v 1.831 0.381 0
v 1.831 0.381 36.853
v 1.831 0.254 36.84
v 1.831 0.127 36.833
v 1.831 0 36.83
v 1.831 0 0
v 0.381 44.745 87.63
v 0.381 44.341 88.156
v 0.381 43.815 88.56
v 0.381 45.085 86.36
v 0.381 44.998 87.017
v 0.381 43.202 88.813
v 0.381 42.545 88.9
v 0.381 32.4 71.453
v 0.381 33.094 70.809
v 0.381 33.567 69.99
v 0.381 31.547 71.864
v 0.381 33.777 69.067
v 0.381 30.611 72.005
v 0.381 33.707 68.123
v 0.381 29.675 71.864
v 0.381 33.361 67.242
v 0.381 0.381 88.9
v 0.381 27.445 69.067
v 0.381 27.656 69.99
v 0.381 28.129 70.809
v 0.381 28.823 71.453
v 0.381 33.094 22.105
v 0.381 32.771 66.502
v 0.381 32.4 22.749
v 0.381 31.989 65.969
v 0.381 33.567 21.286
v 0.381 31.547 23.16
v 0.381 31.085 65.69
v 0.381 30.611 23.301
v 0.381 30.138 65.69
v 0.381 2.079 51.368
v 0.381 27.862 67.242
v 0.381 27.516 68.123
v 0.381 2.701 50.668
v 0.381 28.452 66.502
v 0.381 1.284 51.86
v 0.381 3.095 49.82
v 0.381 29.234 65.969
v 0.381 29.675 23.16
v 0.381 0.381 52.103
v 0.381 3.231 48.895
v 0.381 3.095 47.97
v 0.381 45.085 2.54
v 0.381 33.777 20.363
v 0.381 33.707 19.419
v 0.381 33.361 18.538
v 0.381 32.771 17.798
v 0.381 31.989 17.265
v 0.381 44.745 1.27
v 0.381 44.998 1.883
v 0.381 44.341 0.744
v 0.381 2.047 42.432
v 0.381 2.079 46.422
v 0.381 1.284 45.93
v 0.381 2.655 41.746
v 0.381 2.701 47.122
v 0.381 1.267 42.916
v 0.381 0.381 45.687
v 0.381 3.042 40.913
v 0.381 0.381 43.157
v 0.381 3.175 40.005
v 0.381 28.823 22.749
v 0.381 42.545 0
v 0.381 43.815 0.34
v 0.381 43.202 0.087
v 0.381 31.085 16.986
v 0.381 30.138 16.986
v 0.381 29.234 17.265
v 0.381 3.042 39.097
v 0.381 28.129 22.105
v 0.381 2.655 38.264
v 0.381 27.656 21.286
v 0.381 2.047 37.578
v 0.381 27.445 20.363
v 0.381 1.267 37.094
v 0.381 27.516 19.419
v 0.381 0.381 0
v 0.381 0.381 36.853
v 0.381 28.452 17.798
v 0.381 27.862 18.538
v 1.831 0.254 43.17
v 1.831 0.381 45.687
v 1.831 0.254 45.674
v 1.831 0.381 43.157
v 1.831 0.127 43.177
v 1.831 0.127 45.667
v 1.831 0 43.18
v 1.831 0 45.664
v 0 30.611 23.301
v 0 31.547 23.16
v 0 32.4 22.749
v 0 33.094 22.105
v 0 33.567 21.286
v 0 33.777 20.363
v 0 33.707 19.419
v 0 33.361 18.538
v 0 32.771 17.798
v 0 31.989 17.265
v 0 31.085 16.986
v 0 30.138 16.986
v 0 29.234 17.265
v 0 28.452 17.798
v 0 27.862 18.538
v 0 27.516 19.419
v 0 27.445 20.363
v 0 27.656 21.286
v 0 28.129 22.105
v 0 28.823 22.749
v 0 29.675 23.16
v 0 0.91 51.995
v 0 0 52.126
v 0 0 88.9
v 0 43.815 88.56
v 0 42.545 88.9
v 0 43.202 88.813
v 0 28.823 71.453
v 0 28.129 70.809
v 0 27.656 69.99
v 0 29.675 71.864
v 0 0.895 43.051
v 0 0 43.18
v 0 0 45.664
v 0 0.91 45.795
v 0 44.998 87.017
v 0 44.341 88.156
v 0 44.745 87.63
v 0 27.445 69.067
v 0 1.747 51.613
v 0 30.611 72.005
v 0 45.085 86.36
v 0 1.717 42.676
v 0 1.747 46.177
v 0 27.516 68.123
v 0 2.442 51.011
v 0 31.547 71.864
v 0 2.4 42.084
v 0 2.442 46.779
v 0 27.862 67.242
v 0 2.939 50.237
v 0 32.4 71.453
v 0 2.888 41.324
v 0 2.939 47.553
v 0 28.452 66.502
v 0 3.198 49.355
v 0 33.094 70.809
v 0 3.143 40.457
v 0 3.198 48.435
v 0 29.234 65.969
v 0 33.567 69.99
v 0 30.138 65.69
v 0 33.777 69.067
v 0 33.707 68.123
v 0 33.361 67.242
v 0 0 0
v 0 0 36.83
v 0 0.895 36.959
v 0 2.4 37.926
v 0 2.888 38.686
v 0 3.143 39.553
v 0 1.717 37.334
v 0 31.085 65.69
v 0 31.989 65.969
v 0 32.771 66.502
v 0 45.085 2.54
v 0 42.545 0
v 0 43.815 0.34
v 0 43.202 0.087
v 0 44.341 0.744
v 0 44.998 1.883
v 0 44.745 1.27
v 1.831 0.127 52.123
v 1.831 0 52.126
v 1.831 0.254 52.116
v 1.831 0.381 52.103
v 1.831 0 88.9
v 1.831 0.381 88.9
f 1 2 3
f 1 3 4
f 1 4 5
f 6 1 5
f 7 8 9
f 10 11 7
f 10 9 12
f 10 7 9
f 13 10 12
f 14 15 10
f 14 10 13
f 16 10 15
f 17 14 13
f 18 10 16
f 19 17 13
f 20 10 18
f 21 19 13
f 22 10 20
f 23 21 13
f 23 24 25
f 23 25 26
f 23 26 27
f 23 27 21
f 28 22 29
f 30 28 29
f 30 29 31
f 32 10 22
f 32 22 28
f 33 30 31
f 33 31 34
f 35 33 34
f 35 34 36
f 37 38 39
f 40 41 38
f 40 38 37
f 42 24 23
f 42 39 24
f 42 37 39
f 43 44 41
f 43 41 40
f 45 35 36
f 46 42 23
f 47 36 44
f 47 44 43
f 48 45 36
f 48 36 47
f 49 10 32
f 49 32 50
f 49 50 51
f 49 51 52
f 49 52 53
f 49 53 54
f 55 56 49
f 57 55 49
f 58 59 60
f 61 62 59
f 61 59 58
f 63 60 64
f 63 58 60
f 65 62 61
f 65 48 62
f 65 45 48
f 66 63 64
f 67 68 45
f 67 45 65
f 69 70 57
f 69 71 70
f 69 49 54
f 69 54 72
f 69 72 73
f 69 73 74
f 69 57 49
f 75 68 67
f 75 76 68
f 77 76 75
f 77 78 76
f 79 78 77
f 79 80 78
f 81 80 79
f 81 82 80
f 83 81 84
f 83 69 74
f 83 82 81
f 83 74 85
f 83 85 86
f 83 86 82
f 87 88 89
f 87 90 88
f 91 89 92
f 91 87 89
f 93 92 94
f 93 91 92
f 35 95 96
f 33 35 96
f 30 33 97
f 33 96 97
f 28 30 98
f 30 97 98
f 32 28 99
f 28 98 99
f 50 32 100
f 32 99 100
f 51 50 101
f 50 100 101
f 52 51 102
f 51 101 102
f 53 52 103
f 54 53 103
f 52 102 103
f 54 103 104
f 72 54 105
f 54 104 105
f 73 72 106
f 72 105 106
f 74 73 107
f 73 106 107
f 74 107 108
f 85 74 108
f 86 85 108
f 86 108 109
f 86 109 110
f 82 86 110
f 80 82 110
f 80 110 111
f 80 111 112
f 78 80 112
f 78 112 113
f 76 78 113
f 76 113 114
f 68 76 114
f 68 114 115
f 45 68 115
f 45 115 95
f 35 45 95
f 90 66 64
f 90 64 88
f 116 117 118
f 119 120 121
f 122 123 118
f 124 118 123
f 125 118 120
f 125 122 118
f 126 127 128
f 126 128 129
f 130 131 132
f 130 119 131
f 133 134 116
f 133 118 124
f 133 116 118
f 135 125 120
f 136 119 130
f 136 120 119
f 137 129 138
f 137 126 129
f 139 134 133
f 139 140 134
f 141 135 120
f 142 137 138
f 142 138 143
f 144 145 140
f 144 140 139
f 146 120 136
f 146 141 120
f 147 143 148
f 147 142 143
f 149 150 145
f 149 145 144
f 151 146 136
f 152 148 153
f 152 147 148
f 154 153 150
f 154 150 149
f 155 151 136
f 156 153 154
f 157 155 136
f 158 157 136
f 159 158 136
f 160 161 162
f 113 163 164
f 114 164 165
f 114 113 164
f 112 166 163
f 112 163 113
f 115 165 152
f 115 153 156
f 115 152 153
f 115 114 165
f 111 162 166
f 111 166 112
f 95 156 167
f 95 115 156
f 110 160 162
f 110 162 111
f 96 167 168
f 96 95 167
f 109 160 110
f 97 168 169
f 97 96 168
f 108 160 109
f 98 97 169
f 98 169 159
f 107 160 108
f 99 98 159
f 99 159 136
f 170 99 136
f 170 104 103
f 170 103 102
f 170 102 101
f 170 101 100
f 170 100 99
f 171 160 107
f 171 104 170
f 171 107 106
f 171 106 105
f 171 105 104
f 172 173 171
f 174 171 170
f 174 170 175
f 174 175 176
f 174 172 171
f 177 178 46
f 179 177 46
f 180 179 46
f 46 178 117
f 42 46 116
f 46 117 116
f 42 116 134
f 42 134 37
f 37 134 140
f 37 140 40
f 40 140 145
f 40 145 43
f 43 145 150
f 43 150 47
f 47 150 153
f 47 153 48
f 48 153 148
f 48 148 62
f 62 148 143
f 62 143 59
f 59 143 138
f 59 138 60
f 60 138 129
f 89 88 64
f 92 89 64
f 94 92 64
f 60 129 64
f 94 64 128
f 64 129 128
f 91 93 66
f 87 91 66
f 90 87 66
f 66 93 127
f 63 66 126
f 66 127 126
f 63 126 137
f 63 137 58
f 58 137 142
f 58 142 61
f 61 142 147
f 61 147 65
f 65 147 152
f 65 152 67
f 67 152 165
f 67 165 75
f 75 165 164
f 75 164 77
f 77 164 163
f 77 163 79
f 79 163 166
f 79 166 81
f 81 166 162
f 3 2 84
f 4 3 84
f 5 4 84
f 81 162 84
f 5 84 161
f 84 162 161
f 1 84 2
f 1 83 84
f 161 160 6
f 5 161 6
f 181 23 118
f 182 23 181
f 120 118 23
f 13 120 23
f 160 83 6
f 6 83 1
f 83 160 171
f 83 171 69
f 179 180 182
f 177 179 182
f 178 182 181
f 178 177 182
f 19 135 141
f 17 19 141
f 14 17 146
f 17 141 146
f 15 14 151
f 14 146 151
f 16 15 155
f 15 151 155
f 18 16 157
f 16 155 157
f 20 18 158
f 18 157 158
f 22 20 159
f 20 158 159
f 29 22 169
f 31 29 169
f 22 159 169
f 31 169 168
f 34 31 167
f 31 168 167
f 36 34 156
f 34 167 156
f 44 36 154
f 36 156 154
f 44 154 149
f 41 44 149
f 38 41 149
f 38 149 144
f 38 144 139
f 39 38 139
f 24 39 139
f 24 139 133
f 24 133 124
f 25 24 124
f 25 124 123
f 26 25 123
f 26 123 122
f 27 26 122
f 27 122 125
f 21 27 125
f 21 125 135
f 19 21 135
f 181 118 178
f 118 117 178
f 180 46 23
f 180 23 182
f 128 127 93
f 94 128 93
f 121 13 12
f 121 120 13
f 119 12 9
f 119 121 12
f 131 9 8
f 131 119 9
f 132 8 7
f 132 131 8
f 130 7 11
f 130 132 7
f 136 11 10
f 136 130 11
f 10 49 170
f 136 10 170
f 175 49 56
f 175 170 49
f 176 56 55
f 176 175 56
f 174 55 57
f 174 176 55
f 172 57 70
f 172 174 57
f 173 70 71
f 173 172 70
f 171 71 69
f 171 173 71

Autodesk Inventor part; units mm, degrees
ref_plane "YZ Plane" through (0, 0, 0) normal (1, 0, 0) x (0, 1, 0)
ref_plane "XZ Plane" through (0, 0, 0) normal (0, 1, 0) x (-1, 0, 0)
ref_plane "XY Plane" through (0, 0, 0) normal (0, 0, 1) x (1, 0, 0)
sketch "Sketch1" plane through (0, 0, 0) normal (0, 0, 1) x (1, 0, 0)
  line L0 (0, 0) -> (1.8311, 0)
  line L1 (0, 0) -> (0, 45.085)
  line L2 (0.381, 45.085) -> (0.381, 0.381)
  line L3 (0.381, 0.381) -> (1.8311, 0.381)
  line L4 (1.8311, 0.381) -> (1.8311, 0)
  line L5 (0.381, 45.085) -> (0, 45.085)
  dimension "d0" = 1.8311
  dimension "d1" = 45.085
  dimension "d2" = 0.381
extrude "Extrusion1" add sketch "Sketch1" along normal blind 88.9
fillet "Fillet1" radius 2.54 2 edges at (0.1905, 45.085, 88.9) (0.1905, 45.085, 0)
sketch "Sketch2" plane through (0, 0, 0) normal (-1, 0, 0) x (0, 0, 1)
  line L0 (0, 0) -> (88.9, 0) projected
  circle A0 centre (40.005, 0) radius 3.175
  circle A1 centre (48.895, 0) radius 3.2307
  dimension "d6" = 6.35
  dimension "d7" = 8.89
  dimension "d8" = 40.005
extrude "Extrusion2" cut sketch "Sketch2" against normal blind 88.9
sketch "Sketch3" plane through (0, 0, 0) normal (-1, 0, 0) x (0, 0, 1)
  circle A0 centre (20.1258, 30.6113) radius 3.175
  circle A1 centre (68.8299, 30.6113) radius 3.175
  line L0 (88.9, 42.545) -> (88.9, 0) projected
  line L1 (0, 42.545) -> (0, 0) projected
  line L2 (2.54, 45.085) -> (86.36, 45.085) projected
  line L3 (68.8299, 30.6113) -> (48.9507, 0)
  line L4 (48.9507, 0) -> (88.9, 0)
  line L5 (20.1258, 30.6113) -> (40.005, 0)
  line L6 (0, 0.381) -> (36.8529, 0.381) projected
  line L7 (40.005, 0) -> (0, 0)
  point P0 (52.1257, 0)
  point P1 (36.83, 0)
  dimension "d11" = 6.35
  dimension "d12" = 6.35
  dimension "d19" = 3.175
  dimension "d20" = 3.175
  dimension "d21" = 36.4998
  dimension "d22" = 45.085
  dimension "d23" = 45.085
  dimension "d24" = 36.4998
  dimension "d25" = 57
  dimension "d26" = 57
extrude "Extrusion3" cut sketch "Sketch3" against normal blind 88.9
properties part number "Fin_full" material "Aluminum 6061"
